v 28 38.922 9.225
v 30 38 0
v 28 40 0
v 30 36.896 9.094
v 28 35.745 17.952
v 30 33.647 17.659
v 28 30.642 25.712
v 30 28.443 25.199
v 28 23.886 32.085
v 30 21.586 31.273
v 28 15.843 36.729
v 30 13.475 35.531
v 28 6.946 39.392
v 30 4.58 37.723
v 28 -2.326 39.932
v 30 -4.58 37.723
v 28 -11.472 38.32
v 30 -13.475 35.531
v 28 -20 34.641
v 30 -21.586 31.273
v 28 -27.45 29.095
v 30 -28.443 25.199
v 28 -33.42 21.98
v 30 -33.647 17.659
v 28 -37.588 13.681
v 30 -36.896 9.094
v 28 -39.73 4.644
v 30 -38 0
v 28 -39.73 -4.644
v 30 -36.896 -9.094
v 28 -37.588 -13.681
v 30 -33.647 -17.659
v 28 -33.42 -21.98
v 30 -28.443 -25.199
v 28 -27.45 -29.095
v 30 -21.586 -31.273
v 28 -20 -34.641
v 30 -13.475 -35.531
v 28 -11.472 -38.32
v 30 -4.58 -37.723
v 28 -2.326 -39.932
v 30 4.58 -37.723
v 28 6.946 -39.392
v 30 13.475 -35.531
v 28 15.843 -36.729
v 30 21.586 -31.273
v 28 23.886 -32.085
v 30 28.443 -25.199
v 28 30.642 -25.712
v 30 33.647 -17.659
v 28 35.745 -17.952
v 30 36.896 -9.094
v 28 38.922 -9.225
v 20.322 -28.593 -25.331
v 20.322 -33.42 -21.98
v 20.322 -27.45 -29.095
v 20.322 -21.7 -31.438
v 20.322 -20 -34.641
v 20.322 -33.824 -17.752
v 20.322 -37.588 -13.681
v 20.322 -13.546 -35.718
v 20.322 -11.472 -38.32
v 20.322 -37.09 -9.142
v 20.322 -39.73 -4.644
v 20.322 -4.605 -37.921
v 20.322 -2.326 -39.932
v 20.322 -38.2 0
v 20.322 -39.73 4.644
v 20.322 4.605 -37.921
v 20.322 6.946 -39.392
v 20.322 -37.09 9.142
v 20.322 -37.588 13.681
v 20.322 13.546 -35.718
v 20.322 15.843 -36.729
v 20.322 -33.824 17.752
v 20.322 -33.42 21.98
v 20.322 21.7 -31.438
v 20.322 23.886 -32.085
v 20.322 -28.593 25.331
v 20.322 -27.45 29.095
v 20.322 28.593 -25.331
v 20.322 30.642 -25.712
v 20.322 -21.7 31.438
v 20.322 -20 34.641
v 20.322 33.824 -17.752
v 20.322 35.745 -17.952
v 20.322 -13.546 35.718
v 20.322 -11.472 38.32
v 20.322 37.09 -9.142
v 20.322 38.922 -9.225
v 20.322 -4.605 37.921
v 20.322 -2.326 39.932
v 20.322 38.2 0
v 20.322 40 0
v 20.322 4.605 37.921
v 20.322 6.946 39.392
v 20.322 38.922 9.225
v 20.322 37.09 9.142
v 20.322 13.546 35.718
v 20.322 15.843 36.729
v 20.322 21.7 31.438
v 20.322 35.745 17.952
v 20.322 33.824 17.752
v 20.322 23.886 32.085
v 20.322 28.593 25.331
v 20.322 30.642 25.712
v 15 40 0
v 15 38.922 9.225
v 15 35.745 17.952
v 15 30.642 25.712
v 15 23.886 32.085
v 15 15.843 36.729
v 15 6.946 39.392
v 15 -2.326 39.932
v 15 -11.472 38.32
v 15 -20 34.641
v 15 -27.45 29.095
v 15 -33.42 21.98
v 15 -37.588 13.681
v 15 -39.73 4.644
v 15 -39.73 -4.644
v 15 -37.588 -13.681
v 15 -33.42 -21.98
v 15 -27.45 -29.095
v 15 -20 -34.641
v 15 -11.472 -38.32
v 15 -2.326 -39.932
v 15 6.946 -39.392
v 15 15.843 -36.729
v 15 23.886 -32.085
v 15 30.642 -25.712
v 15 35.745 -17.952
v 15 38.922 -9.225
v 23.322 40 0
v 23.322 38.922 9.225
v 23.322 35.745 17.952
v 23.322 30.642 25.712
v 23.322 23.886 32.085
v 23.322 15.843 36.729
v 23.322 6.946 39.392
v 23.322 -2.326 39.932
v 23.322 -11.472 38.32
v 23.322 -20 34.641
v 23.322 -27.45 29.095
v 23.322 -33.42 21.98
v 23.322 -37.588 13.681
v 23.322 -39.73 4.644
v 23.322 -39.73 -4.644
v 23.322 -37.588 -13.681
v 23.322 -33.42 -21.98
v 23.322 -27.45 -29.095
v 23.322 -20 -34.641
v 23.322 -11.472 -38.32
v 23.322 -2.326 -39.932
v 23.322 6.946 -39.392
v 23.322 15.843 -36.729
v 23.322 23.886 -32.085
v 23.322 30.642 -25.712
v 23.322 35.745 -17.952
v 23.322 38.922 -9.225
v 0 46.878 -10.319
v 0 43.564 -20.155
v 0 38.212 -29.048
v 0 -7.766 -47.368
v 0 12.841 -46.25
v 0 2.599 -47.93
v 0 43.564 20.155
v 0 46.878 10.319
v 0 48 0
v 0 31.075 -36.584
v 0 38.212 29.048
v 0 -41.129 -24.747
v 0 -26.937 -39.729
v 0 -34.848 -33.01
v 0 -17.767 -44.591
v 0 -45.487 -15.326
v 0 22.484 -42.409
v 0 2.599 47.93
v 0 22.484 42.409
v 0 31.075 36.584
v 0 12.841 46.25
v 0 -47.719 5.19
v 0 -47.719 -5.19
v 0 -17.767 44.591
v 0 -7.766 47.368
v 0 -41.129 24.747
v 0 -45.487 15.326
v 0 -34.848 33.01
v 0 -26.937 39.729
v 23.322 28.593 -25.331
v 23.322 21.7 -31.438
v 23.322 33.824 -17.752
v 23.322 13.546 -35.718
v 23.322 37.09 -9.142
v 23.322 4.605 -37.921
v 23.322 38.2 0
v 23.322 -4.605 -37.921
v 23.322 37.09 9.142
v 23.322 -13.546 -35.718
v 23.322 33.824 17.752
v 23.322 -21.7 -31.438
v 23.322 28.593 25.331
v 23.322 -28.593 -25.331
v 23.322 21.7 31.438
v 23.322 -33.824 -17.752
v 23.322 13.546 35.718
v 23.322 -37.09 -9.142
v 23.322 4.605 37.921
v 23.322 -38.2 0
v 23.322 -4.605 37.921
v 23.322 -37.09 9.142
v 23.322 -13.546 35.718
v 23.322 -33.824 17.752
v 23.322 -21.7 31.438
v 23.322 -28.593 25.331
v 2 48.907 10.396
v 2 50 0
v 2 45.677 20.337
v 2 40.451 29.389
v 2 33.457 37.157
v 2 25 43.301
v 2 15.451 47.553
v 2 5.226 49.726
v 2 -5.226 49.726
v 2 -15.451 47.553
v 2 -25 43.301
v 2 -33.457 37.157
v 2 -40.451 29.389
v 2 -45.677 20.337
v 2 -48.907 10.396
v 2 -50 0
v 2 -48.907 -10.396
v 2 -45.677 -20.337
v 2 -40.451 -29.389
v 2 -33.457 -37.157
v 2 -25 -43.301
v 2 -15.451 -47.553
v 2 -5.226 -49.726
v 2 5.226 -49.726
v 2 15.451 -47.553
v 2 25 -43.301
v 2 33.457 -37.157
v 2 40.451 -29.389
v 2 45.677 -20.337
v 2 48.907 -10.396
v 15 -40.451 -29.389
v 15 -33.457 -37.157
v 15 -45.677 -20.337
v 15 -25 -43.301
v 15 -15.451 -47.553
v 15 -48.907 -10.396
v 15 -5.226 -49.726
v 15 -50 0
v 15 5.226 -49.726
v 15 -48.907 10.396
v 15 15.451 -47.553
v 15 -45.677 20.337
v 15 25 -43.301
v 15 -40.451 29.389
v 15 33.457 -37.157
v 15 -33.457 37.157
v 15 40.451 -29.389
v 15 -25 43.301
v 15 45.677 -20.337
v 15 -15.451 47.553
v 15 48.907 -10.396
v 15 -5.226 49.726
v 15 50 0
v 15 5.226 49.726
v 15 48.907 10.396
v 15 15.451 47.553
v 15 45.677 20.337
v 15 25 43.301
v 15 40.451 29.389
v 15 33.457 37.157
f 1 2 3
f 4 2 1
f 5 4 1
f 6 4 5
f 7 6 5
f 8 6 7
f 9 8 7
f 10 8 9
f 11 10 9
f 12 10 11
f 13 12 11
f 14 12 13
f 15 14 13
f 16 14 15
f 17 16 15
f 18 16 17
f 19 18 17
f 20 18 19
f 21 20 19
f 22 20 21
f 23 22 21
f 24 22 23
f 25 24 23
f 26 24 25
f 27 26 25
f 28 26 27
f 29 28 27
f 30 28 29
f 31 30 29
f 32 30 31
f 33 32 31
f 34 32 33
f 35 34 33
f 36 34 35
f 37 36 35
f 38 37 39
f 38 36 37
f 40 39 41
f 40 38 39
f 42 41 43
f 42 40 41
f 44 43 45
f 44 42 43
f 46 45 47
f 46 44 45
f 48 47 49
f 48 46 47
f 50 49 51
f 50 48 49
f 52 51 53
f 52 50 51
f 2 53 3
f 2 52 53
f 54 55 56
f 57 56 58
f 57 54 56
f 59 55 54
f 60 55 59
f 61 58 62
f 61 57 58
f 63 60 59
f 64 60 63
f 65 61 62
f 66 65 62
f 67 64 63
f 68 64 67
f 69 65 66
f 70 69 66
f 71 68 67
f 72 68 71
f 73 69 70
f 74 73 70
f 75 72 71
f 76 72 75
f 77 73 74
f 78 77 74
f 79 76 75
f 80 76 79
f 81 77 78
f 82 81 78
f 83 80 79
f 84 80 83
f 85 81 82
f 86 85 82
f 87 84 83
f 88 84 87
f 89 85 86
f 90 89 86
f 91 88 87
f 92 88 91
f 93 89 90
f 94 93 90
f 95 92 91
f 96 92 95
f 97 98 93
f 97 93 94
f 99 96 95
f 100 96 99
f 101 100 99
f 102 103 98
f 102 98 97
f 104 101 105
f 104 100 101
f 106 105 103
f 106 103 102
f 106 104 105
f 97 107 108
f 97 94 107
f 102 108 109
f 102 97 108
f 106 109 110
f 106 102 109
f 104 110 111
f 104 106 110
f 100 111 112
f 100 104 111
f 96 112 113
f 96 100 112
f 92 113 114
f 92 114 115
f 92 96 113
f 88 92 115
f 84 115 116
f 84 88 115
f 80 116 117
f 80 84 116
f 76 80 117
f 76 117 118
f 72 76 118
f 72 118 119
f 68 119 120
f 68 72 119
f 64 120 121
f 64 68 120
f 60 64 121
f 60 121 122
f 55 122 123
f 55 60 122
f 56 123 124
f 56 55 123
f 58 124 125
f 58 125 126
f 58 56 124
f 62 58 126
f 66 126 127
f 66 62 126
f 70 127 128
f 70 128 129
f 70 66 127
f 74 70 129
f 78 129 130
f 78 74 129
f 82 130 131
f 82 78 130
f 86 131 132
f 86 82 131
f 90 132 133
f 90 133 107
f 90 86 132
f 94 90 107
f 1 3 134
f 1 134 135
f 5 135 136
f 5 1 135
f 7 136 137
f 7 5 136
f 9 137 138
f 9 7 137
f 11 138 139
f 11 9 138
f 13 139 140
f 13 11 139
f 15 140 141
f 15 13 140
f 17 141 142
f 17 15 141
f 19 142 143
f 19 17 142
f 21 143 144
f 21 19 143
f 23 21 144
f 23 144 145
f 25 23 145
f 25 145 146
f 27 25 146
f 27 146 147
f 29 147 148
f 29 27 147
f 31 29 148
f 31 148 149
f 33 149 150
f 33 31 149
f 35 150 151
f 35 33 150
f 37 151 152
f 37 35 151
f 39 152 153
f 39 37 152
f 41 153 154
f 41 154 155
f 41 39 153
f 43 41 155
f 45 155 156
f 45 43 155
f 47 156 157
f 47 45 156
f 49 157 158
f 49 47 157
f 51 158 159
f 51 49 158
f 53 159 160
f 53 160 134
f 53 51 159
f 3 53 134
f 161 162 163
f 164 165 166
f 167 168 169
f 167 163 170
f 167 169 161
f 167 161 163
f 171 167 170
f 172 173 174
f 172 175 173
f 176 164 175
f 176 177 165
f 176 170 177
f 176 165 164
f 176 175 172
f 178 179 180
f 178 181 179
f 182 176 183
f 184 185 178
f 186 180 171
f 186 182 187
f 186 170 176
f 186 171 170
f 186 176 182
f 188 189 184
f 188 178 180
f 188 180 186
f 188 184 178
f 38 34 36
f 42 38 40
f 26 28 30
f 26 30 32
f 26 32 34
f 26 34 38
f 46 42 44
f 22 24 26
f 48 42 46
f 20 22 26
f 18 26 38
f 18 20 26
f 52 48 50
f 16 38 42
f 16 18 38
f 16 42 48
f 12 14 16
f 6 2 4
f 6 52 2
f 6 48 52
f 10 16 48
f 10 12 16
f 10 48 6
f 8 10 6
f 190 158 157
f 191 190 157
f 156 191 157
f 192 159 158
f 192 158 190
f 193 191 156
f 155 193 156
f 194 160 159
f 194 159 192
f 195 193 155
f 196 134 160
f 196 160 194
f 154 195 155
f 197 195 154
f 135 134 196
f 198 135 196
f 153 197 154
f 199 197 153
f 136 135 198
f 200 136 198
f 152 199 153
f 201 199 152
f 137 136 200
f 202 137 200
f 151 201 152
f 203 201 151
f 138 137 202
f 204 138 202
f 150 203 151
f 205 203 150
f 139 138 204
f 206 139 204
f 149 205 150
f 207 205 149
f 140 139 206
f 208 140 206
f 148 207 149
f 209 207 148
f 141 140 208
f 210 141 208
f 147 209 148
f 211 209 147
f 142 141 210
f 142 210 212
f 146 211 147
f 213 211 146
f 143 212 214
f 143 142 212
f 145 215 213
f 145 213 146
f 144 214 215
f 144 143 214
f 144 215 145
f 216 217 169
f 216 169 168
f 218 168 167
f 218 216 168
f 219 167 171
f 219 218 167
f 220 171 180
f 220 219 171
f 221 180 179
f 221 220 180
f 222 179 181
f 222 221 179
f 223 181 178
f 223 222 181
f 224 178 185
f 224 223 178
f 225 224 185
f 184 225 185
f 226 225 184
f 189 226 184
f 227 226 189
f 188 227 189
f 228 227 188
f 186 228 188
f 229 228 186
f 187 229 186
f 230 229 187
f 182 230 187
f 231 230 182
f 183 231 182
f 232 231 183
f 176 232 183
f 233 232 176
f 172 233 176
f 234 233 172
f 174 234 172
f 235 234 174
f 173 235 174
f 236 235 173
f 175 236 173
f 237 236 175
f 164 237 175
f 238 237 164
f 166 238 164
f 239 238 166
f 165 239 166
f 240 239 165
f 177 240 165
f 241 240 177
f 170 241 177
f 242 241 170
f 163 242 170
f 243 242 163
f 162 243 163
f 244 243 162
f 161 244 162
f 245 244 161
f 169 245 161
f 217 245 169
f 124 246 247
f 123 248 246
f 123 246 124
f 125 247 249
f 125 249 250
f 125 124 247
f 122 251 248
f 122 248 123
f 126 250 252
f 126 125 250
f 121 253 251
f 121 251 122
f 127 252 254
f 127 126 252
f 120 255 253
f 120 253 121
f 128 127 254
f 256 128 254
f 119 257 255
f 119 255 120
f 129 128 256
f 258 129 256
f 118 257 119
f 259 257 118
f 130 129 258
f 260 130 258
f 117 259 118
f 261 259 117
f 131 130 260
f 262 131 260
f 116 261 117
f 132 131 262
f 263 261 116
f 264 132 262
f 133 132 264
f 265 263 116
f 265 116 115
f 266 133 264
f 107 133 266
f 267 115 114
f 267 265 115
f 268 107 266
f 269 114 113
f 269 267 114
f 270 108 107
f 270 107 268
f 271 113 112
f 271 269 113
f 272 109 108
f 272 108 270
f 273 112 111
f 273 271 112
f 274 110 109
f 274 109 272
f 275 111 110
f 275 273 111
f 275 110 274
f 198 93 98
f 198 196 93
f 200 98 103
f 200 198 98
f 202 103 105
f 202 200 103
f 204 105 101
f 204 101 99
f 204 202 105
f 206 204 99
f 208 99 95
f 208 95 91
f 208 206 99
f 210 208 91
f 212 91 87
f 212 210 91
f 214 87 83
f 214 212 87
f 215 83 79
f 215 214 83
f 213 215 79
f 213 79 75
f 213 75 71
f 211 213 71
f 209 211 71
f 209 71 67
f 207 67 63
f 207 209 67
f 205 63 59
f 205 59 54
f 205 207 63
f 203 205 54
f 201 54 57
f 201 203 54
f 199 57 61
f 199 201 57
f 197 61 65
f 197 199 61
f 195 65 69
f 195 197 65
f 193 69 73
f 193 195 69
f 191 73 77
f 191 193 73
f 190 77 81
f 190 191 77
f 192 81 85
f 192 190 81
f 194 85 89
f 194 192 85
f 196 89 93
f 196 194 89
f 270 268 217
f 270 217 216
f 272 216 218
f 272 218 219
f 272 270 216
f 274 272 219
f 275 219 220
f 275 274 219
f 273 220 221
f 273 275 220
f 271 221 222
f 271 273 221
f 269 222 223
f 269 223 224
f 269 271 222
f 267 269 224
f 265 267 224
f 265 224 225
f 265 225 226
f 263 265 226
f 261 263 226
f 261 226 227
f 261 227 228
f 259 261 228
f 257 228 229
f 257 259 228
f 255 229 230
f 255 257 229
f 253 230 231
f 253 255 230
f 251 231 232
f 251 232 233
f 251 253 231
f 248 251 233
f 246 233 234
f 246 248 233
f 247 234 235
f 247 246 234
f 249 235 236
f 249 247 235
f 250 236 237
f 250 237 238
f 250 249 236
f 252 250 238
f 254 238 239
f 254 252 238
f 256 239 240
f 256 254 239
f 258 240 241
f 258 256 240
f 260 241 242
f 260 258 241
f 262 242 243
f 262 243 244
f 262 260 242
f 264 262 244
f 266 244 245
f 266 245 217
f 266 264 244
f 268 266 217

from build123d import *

# Parameters (mm, degrees)
FASE1_SIZE = 2


with BuildPart() as part:
    # Skizze1 → Rotation1 (revolve)
    with BuildSketch(Plane.XY):
        Polygon((0, 0), (0, 50), (15, 50), (15, 40), (20.322114174, 40), (20.322114174, 38.2), (23.322114174, 38.2), (23.322114174, 40), (30, 40), (30, 0), align=None)
    revolve(axis=Axis((0, 0, 0), (1, 0, 0)))

    # Fase1
    fase1_edges = [part.edges().sort_by_distance(p)[0] for p in [
        (0, -50, 0),
        (30, -40, 0),
    ]]
    chamfer(fase1_edges, length=FASE1_SIZE)


solid = part.part
